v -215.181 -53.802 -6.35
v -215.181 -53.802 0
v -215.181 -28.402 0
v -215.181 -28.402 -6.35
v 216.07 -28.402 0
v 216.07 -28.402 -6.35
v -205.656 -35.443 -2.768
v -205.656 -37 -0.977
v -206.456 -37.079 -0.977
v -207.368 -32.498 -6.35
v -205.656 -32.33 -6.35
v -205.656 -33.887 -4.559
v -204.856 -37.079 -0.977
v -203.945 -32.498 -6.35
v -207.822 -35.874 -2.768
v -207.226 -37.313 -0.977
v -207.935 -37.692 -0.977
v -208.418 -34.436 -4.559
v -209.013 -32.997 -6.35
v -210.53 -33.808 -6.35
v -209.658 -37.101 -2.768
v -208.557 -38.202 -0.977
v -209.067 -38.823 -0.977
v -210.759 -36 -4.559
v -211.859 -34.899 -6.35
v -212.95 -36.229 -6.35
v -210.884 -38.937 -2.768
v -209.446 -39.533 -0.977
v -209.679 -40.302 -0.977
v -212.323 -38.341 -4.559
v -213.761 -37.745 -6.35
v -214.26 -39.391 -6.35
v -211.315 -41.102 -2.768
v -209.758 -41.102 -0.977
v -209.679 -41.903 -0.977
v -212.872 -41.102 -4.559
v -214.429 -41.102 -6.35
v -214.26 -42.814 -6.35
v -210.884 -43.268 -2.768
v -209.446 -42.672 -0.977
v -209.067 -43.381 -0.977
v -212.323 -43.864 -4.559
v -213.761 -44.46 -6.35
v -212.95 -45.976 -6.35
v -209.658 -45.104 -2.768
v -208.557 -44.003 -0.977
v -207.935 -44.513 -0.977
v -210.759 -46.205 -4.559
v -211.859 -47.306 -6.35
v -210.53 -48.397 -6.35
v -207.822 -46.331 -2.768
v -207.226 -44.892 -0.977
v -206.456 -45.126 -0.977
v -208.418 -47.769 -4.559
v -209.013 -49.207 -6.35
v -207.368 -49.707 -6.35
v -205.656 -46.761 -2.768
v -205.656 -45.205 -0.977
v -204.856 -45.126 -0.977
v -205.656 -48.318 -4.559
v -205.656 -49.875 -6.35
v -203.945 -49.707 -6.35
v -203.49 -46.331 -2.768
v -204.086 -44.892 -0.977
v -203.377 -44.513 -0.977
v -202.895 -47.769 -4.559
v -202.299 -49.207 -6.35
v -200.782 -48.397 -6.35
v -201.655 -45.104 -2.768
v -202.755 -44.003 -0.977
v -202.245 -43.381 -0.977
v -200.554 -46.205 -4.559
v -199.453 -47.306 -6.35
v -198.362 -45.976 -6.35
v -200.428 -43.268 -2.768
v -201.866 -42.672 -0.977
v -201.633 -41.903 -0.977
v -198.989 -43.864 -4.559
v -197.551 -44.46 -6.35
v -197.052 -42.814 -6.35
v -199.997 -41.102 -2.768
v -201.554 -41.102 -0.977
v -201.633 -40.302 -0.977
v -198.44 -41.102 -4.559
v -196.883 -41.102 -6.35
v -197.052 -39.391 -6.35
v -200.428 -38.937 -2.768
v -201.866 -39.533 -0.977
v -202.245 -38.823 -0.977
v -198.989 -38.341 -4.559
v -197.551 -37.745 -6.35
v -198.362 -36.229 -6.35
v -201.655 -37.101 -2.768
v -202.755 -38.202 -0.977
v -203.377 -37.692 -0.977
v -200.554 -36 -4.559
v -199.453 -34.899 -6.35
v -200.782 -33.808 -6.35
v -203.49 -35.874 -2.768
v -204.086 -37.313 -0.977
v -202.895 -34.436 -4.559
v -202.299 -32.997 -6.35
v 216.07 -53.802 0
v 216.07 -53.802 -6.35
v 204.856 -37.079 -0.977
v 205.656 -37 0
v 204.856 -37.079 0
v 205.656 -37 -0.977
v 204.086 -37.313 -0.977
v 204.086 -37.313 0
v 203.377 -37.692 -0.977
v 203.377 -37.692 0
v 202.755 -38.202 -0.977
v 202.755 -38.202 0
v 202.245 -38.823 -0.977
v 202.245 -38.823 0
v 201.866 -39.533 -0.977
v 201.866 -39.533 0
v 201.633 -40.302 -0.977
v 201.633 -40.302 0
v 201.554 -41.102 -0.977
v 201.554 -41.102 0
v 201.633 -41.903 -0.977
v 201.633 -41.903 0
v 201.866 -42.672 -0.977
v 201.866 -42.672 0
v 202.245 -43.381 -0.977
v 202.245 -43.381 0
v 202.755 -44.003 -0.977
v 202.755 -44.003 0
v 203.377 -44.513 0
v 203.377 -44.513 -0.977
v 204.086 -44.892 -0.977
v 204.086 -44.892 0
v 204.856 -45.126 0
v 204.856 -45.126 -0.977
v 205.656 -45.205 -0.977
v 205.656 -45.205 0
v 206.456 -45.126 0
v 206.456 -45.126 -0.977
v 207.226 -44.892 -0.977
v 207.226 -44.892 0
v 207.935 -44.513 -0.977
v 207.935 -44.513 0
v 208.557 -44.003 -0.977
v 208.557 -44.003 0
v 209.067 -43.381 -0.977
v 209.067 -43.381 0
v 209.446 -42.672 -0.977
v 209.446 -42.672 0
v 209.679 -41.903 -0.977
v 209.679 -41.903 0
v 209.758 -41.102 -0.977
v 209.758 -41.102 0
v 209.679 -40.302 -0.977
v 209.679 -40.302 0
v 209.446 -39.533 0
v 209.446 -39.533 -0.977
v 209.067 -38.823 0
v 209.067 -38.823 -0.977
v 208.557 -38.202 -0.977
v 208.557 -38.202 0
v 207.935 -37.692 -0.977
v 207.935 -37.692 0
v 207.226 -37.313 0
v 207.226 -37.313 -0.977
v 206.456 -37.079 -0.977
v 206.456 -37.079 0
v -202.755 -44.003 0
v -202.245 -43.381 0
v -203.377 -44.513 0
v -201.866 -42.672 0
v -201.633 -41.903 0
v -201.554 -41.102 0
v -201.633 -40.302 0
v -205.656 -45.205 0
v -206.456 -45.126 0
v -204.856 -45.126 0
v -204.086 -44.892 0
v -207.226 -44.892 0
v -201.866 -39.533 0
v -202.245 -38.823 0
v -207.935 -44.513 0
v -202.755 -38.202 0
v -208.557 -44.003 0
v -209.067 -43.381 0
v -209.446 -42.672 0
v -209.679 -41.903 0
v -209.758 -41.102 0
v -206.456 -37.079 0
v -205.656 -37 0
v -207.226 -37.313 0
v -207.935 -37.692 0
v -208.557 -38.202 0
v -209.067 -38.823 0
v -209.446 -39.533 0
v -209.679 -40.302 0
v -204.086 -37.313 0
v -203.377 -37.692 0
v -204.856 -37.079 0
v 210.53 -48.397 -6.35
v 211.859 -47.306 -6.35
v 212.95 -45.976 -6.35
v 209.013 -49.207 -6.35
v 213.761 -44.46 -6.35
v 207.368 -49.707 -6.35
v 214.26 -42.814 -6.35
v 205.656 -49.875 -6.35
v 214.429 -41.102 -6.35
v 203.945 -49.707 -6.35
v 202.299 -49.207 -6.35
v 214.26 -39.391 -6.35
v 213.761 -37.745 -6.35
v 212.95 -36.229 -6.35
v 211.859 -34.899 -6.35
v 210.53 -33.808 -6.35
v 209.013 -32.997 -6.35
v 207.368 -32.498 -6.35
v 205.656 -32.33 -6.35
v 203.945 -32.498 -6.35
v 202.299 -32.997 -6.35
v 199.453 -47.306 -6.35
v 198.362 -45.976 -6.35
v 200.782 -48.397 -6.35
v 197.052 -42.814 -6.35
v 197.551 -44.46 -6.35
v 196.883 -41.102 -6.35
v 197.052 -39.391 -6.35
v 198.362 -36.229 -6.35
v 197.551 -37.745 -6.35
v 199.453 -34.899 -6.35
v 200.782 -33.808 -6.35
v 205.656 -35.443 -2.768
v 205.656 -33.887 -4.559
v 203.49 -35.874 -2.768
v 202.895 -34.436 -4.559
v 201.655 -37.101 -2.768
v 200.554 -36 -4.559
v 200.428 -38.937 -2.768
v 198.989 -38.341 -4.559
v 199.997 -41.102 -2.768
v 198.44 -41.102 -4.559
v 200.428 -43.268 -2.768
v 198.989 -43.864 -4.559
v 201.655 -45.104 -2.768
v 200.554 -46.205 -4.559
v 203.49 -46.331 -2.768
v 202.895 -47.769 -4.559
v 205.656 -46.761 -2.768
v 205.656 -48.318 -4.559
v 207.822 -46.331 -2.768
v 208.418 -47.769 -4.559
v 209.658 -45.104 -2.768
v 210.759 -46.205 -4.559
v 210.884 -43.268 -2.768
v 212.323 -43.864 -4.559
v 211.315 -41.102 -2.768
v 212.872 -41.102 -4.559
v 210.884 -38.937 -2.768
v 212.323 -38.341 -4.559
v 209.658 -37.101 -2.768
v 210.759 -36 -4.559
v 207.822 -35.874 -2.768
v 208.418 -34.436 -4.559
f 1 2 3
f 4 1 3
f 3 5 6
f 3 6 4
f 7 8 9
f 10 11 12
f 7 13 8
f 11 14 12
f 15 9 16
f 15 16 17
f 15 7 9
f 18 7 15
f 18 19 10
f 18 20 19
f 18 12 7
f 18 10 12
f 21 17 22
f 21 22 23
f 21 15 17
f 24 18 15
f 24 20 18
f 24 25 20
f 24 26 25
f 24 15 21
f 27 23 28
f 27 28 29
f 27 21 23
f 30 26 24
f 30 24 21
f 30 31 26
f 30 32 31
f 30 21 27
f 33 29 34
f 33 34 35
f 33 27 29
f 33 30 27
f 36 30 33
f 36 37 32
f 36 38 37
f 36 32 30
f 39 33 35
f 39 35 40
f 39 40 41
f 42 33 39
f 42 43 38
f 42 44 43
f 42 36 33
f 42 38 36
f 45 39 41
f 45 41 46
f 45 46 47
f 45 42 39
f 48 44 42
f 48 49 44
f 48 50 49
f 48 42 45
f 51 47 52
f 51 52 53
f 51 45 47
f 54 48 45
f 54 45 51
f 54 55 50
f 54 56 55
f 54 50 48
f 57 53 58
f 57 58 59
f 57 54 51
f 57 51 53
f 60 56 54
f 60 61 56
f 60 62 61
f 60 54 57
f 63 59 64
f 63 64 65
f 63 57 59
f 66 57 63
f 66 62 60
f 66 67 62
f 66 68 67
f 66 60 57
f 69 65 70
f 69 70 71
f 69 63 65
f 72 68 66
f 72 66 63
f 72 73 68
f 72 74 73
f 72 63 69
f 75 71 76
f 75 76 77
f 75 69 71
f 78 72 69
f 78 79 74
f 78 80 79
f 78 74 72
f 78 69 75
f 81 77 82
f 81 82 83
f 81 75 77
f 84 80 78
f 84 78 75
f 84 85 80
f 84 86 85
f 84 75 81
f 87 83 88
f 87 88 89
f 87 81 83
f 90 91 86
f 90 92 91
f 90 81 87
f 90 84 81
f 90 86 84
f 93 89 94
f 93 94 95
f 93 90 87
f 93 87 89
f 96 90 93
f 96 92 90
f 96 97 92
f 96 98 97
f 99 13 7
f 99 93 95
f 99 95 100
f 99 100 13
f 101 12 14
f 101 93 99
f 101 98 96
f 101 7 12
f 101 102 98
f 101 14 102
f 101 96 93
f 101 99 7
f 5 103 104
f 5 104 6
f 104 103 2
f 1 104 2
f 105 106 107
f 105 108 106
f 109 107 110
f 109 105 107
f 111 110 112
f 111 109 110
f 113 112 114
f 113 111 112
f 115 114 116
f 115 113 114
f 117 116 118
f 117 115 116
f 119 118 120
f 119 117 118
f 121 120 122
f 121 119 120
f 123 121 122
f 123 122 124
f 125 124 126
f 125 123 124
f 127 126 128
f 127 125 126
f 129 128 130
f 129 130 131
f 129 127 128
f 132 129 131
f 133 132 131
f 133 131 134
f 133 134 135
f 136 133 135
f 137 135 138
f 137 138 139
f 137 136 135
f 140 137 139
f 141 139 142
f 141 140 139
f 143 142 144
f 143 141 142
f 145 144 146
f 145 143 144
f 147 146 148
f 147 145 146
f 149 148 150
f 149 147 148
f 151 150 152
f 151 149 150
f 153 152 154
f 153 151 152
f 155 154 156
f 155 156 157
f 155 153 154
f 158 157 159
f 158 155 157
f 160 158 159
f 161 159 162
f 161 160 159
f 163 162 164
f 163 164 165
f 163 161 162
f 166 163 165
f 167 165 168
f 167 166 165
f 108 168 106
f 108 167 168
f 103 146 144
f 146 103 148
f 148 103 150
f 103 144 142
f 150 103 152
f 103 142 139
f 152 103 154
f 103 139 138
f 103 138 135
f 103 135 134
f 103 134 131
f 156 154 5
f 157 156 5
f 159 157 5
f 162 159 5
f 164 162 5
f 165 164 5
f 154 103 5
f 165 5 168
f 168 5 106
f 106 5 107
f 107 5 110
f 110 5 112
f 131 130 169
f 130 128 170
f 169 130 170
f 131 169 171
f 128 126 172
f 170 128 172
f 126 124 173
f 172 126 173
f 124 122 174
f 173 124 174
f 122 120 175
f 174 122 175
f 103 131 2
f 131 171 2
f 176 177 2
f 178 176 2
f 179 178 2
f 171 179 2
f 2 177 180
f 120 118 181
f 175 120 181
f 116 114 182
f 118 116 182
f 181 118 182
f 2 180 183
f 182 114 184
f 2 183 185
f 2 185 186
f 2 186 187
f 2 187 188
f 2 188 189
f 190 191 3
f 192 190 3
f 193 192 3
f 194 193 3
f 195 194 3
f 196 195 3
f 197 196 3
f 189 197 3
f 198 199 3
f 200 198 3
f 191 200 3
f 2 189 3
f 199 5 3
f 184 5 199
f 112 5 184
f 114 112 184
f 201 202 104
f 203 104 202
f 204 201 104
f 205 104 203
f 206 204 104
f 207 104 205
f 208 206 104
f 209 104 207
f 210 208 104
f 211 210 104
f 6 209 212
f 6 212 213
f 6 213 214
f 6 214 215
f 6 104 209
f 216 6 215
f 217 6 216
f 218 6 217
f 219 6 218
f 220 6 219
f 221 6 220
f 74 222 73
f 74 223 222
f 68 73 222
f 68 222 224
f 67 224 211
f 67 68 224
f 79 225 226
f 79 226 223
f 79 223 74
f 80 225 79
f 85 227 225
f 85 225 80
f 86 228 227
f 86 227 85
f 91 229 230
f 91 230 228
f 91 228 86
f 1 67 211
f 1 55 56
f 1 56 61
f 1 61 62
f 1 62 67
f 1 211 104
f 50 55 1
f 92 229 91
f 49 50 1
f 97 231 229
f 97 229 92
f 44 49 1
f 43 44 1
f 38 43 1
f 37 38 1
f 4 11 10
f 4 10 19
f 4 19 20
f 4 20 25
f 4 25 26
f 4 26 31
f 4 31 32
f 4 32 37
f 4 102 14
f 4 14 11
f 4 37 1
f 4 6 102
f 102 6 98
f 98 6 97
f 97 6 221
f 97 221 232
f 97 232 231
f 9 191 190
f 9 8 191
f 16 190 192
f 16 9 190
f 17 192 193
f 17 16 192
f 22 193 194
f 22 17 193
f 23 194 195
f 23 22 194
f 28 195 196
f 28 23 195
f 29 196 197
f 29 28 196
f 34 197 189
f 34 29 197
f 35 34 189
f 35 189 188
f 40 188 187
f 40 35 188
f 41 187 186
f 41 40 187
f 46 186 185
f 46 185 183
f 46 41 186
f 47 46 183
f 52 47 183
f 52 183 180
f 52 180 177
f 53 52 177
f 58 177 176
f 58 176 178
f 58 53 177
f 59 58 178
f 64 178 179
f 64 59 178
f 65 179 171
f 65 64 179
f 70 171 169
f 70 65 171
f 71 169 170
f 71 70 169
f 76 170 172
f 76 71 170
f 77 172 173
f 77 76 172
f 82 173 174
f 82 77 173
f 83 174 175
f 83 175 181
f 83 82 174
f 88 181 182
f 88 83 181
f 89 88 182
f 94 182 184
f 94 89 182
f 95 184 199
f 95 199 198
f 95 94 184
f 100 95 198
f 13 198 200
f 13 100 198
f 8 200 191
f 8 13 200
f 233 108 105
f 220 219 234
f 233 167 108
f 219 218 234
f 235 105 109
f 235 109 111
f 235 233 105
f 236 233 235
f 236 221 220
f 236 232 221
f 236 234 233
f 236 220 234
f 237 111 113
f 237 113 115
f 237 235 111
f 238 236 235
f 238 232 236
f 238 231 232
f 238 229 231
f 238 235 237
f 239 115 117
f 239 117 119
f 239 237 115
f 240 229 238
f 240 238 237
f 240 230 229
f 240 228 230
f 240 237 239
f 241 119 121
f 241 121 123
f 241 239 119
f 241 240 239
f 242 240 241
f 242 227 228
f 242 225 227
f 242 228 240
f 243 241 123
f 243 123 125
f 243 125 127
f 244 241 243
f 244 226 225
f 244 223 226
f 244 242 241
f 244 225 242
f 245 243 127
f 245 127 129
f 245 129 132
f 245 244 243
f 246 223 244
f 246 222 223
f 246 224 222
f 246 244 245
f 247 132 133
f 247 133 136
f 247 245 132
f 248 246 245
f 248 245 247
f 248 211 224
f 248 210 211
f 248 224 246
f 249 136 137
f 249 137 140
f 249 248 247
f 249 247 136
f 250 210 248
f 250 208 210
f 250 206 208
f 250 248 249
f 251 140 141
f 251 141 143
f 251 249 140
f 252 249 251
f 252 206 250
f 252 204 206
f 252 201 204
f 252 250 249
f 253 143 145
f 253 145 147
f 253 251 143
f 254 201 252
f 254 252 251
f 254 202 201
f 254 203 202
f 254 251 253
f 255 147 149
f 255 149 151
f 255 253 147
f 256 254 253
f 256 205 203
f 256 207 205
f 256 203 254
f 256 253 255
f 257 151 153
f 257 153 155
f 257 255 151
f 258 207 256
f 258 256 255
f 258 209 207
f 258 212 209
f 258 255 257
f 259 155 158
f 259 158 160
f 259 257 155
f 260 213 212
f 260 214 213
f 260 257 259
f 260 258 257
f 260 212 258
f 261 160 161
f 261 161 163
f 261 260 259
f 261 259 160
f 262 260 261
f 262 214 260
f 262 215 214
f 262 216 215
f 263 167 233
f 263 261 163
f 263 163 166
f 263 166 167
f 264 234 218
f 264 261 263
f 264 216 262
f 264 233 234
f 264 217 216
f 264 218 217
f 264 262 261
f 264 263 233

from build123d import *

# Parameters (mm, degrees)
SKETCH3_W                                    = 431.251100871
SKETCH3_H                                    = 25.4
EXTRUDE1_DEPTH                               = 6.35
CSK_FOR_5_16_FLAT_HEAD_SOCKET_CAP_SC_2_COUNT = 2
CSK_FOR_5_16_FLAT_HEAD_SOCKET_CAP_SC_2_PITCH = 411.312205256


with BuildPart() as part:
    # Sketch3 → Extrude1 (new body)
    with BuildSketch(Plane(origin=(0, 0, 0), x_dir=(-1, 0, 0), z_dir=(0, 0, -1))):
        with Locations((-0.444447807, -41.102479446)):
            Rectangle(SKETCH3_W, SKETCH3_H)
    extrude(amount=EXTRUDE1_DEPTH)

    # Sketch4 → CSK for 5/16 Flat Head Socket Cap Screw1 (revolve, cut)
    with BuildSketch(Plane(origin=(205.656102628, -41.102479446, -6.35), x_dir=(0, 1, 0), z_dir=(1, 0, 0))):
        Polygon((0, 0), (0, 6.35), (4.1021, 6.35), (4.1021, 5.373016172), (8.7727917, 0), align=None)
    csk_for_5_16_flat_head_socket_cap_screw1 = revolve(axis=Axis((205.656102628, -41.102479446, -12.7), (0, 0, 1)), mode=Mode.SUBTRACT)

    # CSK for 5_16 Flat Head Socket Cap Sc 2: CSK for 5/16 Flat Head Socket Cap Screw1 ×2
    with Locations(*[(-i * CSK_FOR_5_16_FLAT_HEAD_SOCKET_CAP_SC_2_PITCH, 0, 0) for i in range(1, CSK_FOR_5_16_FLAT_HEAD_SOCKET_CAP_SC_2_COUNT)]):
        add(csk_for_5_16_flat_head_socket_cap_screw1, mode=Mode.SUBTRACT)


solid = part.part
